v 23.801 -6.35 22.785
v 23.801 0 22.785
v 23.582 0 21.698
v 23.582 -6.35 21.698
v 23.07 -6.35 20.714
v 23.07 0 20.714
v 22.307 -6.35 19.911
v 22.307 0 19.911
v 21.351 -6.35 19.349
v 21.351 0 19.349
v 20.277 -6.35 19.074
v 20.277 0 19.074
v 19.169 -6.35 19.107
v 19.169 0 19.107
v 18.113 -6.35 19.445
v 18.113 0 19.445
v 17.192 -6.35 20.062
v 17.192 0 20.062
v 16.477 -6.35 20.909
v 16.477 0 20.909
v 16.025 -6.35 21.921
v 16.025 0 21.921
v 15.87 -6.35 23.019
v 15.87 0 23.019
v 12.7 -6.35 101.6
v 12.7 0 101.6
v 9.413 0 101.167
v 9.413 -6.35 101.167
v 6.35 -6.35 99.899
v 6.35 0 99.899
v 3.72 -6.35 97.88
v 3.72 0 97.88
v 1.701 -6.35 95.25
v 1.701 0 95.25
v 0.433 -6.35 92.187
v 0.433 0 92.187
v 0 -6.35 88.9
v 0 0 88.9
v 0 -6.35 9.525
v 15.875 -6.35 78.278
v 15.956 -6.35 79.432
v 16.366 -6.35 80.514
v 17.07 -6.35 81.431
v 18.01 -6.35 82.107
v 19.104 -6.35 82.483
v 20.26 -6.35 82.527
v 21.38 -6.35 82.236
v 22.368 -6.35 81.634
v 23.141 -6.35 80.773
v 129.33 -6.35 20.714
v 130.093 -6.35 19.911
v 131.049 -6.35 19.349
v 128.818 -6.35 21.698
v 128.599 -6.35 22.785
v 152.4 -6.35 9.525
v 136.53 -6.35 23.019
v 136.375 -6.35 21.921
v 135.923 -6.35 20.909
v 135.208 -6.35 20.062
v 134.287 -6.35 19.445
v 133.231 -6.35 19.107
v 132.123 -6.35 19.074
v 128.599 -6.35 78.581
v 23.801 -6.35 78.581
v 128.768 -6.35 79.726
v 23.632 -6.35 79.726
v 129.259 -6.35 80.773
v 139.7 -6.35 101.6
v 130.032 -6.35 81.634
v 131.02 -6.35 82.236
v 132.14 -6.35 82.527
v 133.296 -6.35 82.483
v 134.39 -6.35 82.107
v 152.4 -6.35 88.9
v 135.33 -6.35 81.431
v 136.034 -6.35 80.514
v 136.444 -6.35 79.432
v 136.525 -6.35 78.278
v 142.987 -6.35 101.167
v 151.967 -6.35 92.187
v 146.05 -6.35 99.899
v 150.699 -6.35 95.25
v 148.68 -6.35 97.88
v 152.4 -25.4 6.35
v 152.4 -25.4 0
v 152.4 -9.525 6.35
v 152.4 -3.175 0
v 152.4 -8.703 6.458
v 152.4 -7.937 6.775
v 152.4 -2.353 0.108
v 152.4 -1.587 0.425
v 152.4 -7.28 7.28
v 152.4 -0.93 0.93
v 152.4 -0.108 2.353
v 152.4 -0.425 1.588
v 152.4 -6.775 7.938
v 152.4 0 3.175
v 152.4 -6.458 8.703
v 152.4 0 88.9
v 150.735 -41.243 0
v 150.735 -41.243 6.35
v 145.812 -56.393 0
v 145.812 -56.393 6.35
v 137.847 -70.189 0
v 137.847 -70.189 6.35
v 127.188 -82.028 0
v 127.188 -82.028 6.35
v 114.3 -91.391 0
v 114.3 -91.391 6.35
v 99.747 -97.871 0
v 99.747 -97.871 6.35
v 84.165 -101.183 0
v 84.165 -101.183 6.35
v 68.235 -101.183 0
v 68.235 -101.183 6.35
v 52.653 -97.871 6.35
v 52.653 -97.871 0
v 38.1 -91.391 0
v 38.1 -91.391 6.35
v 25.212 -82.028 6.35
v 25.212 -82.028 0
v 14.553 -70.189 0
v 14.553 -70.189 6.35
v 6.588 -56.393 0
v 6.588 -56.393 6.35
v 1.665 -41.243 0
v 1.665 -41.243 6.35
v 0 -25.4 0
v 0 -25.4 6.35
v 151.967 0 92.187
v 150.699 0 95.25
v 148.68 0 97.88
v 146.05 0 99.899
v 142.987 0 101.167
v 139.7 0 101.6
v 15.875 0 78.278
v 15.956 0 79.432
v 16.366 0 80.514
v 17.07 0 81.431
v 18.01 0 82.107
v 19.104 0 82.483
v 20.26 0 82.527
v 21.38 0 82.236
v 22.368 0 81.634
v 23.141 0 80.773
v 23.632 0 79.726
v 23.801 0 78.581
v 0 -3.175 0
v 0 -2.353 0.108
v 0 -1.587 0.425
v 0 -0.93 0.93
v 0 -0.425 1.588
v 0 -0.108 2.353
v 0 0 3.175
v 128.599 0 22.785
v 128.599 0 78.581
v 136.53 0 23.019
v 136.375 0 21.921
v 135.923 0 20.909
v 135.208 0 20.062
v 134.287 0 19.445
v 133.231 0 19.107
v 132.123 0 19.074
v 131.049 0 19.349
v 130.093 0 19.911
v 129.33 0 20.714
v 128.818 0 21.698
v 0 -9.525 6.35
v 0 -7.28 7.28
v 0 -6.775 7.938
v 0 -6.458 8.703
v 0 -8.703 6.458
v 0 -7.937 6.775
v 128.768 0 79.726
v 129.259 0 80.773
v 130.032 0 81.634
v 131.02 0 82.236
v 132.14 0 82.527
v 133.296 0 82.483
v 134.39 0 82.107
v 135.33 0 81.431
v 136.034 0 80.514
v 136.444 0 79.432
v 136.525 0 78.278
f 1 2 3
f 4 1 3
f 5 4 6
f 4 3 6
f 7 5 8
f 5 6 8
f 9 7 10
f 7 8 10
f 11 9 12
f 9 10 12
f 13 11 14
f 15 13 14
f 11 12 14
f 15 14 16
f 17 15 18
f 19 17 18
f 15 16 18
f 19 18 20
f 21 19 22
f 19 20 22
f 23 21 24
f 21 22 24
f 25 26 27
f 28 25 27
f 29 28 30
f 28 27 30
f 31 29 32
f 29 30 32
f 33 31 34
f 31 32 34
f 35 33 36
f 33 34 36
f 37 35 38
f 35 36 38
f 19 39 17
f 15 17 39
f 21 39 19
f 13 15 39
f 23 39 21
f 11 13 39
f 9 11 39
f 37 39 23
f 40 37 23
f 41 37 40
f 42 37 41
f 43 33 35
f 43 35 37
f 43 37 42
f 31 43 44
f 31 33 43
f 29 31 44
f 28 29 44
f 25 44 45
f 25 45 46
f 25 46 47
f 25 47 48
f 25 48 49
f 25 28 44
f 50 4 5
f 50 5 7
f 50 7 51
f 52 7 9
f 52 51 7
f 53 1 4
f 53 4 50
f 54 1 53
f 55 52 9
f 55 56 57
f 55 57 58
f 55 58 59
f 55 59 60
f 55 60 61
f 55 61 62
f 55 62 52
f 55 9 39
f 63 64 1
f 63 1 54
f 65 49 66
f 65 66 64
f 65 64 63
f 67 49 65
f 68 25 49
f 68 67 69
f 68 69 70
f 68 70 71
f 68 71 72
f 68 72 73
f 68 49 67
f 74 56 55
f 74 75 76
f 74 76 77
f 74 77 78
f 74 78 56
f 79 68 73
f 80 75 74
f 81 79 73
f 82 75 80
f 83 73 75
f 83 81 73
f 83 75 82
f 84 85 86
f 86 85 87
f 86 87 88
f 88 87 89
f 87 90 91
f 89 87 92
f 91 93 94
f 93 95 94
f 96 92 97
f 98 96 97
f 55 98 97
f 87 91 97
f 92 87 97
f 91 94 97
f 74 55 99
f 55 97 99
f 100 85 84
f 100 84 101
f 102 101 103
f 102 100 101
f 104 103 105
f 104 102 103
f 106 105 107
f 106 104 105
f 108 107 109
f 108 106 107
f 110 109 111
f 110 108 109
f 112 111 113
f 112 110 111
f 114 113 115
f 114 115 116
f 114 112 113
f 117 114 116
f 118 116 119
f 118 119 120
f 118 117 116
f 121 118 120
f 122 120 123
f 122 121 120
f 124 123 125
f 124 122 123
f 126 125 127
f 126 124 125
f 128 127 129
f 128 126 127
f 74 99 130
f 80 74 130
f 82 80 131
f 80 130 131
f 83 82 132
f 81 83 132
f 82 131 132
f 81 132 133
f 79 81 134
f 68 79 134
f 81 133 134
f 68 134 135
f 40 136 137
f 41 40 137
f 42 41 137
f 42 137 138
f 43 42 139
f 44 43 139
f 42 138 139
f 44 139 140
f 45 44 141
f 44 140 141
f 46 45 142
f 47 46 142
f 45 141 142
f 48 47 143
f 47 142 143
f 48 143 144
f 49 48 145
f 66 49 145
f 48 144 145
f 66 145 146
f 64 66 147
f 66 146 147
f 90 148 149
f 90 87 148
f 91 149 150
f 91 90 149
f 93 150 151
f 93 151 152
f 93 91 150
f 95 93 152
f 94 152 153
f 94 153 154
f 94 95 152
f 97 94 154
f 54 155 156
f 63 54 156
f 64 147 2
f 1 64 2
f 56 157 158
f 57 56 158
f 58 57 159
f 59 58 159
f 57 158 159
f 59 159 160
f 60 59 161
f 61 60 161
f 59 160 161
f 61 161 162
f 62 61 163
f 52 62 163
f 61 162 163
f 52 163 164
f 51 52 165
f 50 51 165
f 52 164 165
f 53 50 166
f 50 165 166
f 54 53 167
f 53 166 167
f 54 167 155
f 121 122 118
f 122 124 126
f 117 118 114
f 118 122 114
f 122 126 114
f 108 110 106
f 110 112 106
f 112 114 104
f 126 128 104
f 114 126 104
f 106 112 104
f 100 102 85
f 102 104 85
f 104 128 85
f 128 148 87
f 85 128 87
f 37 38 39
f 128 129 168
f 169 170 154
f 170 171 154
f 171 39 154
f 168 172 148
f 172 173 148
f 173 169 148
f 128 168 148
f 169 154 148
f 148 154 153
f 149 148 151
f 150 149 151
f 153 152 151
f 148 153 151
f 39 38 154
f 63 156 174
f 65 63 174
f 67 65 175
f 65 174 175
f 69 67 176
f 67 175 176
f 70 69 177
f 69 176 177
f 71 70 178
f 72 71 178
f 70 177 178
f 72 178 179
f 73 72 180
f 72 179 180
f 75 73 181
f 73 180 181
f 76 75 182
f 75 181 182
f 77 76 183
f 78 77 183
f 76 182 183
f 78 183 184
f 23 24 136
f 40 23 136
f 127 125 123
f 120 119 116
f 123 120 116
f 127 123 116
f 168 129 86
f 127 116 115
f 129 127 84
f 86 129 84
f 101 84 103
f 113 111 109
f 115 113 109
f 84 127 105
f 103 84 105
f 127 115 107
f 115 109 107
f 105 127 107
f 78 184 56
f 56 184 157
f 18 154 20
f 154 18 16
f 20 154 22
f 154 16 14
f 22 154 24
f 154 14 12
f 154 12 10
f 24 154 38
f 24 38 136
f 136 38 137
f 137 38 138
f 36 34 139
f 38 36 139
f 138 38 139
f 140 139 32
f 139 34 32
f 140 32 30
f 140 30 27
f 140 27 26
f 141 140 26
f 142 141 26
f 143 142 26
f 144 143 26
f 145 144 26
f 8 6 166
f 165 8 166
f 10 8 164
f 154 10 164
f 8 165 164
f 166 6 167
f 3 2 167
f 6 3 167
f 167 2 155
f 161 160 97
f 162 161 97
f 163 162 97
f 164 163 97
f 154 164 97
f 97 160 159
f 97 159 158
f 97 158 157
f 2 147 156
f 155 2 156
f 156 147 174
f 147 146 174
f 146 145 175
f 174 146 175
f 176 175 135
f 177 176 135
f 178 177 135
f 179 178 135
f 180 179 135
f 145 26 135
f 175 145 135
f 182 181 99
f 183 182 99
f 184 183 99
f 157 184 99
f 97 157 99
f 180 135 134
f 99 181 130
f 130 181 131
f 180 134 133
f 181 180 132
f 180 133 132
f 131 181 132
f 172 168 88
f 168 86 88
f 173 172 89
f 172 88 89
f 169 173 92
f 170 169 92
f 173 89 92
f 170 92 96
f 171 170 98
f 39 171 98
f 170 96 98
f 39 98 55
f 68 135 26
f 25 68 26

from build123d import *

# Parameters (mm, degrees)
F1_DEPTH = 6.35
F3_DEPTH = 6.35
F4_R     = 3.175


with BuildPart() as f1:
    # F0 (on Front) → F1 (new body)
    with BuildSketch(Plane.XZ):
        with BuildLine():
            Line((0, 88.9), (0, 0))
            Line((0, 0), (152.4, 0))
            Line((152.4, 0), (152.4, 88.9))
            ThreePointArc((152.4, 88.9), (148.680256, 97.880256), (139.7, 101.6))
            Line((139.7, 101.6), (12.7, 101.6))
            ThreePointArc((12.7, 101.6), (3.719744, 97.880256), (0, 88.9))
        make_face()
        with BuildLine():
            ThreePointArc((15.875, 78.277995), (19.680409, 82.547098), (23.800897, 78.58125))
            Line((23.800897, 78.58125), (23.800897, 22.784778))
            ThreePointArc((23.800897, 22.784778), (19.721844, 19.051731), (15.8703, 23.019088))
            Line((15.8703, 23.019088), (15.875, 78.277995))
        make_face(mode=Mode.SUBTRACT)
        with BuildLine():
            Line((128.599103, 22.784778), (128.599103, 78.58125))
            ThreePointArc((128.599103, 78.58125), (132.719591, 82.547098), (136.525, 78.277995))
            Line((136.525, 78.277995), (136.5297, 23.019088))
            ThreePointArc((136.5297, 23.019088), (132.678156, 19.051731), (128.599103, 22.784778))
        make_face(mode=Mode.SUBTRACT)
    extrude(amount=F1_DEPTH)

    # F2 (on face) → F3 (join)
    with BuildSketch(Plane(origin=(0, 0, 0), x_dir=(1, 0, 0), z_dir=(0, 0, -1))):
        with BuildLine():
            Line((0, 0), (152.4, 0))
            Line((152.4, 0), (152.4, 25.4))
            ThreePointArc((152.4, 25.4), (76.2, 101.6), (0, 25.4))
            Line((0, 25.4), (0, 0))
        make_face()
    extrude(amount=-F3_DEPTH)

    # F4
    f4_edges = [f1.edges().sort_by_distance(p)[0] for p in [
        (76.2, 0, 0),
        (76.2, -6.35, 6.35),
    ]]
    fillet(f4_edges, radius=F4_R)


solid = f1.part
